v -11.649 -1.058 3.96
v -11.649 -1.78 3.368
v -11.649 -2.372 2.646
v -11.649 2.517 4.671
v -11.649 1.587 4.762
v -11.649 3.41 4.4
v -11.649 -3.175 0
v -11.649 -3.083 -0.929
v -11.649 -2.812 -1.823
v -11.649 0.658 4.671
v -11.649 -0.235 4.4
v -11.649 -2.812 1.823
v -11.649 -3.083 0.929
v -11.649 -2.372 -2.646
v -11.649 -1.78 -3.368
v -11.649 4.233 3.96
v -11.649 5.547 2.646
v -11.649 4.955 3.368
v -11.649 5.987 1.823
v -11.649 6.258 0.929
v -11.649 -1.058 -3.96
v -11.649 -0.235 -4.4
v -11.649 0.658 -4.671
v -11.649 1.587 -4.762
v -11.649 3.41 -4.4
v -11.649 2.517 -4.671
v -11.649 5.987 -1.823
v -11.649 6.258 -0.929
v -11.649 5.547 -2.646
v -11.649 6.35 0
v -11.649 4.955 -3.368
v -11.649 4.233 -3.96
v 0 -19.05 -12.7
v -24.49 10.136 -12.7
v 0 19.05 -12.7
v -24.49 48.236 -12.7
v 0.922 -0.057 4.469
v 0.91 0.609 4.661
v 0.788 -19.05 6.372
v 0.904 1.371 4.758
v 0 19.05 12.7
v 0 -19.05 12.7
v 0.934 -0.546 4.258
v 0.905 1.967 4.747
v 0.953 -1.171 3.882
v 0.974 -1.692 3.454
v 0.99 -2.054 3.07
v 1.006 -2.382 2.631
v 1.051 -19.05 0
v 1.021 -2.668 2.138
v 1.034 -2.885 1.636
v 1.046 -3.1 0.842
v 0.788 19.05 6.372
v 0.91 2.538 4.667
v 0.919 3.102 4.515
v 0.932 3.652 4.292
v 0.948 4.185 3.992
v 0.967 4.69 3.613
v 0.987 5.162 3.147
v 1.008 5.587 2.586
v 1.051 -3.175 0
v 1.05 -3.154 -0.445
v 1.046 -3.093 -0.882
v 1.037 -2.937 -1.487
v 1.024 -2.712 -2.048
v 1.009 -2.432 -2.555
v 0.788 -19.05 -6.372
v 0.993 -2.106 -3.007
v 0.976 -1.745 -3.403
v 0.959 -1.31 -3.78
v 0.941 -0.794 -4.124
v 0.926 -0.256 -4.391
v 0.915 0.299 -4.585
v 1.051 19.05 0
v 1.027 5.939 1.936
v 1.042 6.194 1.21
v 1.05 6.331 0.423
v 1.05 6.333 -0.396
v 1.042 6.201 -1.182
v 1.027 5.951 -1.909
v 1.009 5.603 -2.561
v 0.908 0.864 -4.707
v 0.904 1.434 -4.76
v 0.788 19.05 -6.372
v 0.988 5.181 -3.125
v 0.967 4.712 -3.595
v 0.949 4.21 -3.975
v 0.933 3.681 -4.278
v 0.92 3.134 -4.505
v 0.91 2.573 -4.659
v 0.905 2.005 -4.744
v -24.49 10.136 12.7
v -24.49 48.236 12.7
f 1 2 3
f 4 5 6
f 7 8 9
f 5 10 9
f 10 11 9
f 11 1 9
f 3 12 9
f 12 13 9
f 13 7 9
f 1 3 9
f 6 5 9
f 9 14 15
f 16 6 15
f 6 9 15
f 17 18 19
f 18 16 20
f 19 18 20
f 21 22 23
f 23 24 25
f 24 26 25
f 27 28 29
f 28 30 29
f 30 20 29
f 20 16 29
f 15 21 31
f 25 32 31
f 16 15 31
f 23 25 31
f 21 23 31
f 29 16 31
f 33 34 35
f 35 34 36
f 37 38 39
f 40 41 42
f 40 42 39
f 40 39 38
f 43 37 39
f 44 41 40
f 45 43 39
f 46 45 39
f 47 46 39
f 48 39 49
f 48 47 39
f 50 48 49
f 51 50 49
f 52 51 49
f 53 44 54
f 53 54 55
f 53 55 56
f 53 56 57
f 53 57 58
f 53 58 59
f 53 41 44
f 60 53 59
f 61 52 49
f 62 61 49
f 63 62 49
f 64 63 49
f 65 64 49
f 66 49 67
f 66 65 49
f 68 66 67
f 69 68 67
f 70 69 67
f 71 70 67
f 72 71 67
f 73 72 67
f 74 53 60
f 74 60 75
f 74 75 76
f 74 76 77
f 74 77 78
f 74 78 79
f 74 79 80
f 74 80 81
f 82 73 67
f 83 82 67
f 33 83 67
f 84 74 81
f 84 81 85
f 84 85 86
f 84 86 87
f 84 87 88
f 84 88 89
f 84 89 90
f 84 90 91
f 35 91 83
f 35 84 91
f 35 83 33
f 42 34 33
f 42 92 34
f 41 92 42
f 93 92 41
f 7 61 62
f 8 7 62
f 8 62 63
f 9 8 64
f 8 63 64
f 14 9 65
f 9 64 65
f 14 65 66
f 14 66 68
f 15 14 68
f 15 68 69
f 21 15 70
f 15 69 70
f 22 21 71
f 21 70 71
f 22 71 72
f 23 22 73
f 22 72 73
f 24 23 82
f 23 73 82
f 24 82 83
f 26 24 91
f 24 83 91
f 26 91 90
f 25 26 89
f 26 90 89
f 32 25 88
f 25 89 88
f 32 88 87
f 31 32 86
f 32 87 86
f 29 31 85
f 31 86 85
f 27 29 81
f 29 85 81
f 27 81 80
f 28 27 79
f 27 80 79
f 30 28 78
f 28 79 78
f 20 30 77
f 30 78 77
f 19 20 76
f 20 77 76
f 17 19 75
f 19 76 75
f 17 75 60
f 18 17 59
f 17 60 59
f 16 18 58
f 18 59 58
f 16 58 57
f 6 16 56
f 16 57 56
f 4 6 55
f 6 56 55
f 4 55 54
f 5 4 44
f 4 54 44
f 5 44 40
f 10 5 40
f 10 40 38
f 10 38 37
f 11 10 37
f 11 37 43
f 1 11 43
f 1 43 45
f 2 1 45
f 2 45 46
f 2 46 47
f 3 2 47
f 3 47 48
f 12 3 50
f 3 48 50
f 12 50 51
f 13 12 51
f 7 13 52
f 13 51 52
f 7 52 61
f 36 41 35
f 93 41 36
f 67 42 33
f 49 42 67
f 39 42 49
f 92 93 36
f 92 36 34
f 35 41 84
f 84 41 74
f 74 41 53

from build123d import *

# Parameters (mm, degrees)
BOSS_EXTRUDE4_DEPTH = 12.7
BOSS_EXTRUDE5_DEPTH = 19.05
SKETCH7_W           = 12.7
SKETCH7_H           = 4.7625


with BuildPart() as part:
    # Sketch5 → Boss-Extrude4 (new, symmetric)
    with BuildSketch(Plane.XY):
        Polygon((0, -19.05), (0, 19.05), (-24.490207929, 48.236293283), (-24.490207929, 10.136293283), align=None)
    extrude(amount=BOSS_EXTRUDE4_DEPTH, both=True)

    # Sketch6 → Boss-Extrude5 (add, symmetric)
    with BuildSketch(Plane(origin=(0, 0, 0), x_dir=(1, 0, 0), z_dir=(0, 1, 0))):
        with BuildLine():
            Line((0, 12.7), (0, -12.7))
            ThreePointArc((0, -12.7), (1.051084135, 0), (0, 12.7))
        make_face()
    extrude(amount=BOSS_EXTRUDE5_DEPTH, both=True)

    # Sketch7 → Cut-Revolve5 (revolve, cut)
    with BuildSketch(Plane.XY, mode=Mode.PRIVATE) as cut_revolve5_sk:
        with Locations((-5.298915865, 3.96875)):
            Rectangle(SKETCH7_W, SKETCH7_H)
    revolve(cut_revolve5_sk.sketch.rotate(Axis((-31.455592934, 1.5875, 0), (1, 0, 0)), 180), axis=Axis((-31.455592934, 1.5875, 0), (1, 0, 0)), mode=Mode.SUBTRACT)


solid = part.part
